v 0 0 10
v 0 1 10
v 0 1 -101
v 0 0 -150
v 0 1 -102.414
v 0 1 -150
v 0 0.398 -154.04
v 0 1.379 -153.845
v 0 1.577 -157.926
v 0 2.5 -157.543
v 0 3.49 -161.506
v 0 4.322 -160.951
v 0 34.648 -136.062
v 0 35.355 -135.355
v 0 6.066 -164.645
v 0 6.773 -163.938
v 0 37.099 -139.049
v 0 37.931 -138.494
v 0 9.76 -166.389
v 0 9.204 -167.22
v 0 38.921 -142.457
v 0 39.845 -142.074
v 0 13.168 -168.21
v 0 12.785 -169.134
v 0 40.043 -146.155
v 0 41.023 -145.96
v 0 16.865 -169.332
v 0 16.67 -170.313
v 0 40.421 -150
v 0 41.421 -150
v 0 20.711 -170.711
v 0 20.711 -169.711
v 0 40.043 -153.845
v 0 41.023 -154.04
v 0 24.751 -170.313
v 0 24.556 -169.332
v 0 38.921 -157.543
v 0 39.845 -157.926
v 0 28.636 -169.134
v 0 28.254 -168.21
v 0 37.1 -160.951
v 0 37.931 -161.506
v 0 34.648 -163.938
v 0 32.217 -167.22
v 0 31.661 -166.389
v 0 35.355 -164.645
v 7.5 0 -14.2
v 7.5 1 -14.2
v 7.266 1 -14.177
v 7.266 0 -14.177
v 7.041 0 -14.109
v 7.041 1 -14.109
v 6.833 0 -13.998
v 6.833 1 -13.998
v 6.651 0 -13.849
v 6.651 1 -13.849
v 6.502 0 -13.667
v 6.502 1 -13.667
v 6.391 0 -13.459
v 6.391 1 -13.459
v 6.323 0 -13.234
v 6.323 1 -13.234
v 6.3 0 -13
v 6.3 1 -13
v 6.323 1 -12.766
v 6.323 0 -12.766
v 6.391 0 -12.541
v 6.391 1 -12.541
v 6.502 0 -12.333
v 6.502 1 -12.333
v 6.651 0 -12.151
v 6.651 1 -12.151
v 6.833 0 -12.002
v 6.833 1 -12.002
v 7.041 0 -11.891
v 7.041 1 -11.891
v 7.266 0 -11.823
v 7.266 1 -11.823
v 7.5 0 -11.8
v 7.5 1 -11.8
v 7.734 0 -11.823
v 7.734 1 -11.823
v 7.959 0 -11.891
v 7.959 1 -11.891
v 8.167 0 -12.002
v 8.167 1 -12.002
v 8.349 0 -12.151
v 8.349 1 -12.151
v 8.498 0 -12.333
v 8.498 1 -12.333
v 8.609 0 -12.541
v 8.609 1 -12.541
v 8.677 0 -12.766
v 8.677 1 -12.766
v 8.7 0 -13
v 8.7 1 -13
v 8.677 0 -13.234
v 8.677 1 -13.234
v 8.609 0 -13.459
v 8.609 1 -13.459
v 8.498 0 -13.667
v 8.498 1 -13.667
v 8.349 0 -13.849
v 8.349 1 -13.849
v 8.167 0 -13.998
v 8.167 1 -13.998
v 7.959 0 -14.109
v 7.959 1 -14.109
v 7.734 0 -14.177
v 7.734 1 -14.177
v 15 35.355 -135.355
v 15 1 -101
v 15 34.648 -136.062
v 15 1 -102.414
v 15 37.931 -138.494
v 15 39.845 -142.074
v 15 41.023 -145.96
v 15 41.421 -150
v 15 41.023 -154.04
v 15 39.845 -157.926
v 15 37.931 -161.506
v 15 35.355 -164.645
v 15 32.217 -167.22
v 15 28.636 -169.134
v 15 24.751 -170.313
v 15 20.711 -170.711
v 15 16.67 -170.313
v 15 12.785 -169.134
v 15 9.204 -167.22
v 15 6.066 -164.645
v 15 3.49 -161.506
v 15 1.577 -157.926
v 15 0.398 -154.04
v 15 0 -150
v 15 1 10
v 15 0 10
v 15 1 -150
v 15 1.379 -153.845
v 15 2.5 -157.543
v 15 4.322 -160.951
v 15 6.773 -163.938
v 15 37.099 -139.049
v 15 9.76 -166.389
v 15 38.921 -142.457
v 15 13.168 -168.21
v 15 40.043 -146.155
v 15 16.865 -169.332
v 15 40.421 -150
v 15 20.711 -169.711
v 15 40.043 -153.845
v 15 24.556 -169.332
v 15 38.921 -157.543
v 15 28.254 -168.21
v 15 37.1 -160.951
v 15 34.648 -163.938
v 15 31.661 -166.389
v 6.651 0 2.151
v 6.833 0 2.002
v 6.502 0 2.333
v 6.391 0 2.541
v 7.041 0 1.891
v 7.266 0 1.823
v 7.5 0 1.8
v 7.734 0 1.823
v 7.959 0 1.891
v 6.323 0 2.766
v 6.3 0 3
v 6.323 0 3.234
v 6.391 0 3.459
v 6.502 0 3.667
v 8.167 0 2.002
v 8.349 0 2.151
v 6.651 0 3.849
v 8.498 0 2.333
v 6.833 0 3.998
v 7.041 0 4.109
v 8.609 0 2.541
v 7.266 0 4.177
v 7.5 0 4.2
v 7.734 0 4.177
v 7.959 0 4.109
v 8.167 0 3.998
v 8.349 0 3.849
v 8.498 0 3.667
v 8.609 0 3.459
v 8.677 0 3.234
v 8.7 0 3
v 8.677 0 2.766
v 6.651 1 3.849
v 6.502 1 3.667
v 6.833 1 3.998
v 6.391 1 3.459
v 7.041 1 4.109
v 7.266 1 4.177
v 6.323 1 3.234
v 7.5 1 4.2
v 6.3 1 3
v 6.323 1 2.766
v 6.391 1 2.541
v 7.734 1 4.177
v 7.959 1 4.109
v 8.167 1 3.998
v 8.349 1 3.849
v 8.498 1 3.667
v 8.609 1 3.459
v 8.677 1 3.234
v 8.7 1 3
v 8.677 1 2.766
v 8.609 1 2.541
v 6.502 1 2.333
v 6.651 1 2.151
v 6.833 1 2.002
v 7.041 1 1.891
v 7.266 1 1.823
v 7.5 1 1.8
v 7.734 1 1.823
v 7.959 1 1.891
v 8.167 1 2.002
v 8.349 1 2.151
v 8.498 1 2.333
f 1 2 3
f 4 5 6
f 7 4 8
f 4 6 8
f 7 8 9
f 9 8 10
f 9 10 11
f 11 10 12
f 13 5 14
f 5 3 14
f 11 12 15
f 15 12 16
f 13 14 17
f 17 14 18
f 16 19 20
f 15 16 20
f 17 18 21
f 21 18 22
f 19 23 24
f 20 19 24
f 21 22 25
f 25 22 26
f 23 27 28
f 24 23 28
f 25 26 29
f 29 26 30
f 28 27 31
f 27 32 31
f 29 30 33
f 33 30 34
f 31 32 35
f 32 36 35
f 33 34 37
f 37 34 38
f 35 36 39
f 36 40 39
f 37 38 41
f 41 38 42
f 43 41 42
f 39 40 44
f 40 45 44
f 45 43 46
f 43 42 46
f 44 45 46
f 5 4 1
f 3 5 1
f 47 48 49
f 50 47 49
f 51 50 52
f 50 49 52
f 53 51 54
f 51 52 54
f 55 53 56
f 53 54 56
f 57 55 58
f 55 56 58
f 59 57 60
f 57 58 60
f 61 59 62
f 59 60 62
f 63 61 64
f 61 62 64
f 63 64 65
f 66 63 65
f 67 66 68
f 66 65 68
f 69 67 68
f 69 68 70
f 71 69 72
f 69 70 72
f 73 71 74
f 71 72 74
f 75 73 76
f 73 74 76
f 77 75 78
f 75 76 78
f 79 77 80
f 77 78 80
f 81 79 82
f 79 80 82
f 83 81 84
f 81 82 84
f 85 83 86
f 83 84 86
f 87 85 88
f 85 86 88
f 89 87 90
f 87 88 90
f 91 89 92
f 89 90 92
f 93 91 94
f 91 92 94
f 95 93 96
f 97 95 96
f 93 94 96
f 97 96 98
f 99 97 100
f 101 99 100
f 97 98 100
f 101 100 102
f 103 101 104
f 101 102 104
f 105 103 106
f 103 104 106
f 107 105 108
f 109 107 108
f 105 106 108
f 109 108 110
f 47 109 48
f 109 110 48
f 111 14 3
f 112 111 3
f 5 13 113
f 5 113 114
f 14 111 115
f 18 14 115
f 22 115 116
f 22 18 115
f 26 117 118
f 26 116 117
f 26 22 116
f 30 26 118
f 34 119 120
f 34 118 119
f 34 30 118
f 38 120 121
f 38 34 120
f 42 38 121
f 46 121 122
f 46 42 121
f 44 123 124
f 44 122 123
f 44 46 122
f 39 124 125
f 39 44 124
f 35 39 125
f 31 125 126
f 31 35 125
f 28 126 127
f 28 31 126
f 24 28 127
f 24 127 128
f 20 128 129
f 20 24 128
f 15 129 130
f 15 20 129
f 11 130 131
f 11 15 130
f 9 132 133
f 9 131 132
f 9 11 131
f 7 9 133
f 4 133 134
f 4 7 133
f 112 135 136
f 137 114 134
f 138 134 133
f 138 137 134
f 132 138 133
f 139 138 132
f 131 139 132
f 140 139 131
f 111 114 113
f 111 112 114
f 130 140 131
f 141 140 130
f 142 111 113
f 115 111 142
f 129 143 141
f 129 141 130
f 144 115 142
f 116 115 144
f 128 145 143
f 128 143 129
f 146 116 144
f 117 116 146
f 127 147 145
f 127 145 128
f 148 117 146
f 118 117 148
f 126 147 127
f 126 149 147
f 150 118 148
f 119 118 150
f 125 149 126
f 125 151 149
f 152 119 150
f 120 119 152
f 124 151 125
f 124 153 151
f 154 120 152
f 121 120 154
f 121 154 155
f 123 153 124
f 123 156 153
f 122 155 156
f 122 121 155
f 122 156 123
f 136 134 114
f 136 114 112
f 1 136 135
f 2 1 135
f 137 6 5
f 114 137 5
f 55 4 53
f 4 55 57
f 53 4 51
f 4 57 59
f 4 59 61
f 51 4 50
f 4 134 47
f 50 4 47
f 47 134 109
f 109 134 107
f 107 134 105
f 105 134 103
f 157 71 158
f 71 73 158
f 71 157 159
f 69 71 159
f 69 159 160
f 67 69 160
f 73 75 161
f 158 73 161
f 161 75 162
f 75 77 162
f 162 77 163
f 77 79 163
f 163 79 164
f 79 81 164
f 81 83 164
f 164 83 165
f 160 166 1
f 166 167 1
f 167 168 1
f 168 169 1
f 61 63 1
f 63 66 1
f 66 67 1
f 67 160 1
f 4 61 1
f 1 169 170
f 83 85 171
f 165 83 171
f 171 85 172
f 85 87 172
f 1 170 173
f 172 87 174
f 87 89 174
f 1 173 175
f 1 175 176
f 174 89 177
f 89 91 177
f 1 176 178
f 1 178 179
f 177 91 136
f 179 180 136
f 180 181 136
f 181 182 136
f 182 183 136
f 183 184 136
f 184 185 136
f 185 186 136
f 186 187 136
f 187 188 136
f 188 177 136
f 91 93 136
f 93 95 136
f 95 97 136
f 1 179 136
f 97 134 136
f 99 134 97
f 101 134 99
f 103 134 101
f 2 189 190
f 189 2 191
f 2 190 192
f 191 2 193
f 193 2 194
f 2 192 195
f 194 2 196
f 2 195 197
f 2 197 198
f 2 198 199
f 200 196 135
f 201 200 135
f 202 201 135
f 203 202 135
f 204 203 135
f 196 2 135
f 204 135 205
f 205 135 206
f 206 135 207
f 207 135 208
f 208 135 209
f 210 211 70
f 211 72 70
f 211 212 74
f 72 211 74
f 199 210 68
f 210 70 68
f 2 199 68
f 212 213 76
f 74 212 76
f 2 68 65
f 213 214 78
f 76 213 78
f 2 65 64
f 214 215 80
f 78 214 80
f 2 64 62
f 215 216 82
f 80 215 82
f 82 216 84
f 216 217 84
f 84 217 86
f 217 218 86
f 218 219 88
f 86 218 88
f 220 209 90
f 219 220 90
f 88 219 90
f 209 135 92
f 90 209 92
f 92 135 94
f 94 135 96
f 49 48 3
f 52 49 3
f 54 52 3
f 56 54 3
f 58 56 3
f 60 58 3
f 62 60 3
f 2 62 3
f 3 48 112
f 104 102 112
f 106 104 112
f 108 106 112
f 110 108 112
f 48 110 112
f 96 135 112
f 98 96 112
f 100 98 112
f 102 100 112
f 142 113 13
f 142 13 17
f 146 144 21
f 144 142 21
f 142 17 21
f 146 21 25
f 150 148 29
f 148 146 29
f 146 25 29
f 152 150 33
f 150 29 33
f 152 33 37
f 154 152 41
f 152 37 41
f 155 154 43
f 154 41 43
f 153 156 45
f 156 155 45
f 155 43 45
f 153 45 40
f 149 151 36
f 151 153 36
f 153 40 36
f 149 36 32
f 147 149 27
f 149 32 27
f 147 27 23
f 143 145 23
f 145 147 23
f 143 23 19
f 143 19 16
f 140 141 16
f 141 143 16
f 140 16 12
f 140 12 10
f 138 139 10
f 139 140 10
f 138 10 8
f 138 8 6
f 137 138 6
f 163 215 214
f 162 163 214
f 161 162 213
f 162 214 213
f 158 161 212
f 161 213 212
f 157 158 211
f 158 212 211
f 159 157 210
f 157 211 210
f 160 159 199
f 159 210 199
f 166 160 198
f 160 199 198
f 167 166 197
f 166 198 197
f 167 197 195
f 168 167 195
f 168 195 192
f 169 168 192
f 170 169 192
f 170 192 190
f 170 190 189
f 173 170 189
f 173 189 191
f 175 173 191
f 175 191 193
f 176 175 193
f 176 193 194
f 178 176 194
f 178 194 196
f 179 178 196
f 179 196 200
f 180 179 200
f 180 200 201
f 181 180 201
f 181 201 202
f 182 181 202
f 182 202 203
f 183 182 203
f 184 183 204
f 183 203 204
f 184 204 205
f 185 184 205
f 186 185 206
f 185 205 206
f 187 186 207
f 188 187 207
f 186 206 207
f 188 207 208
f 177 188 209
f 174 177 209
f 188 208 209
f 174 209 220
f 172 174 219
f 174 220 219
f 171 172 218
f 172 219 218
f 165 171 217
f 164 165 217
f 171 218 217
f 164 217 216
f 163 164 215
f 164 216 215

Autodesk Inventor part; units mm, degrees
ref_plane "YZ Plane" through (0, 0, 0) normal (1, 0, 0) x (0, 1, 0)
ref_plane "XZ Plane" through (0, 0, 0) normal (0, 1, 0) x (-1, 0, 0)
ref_plane "XY Plane" through (0, 0, 0) normal (0, 0, 1) x (1, 0, 0)
sketch "スケッチ3" plane through (0, 0, 0) normal (1, 0, 0) x (0, 1, 0)
  line L0 (0, 0) -> (0, -150)
  line L1 (0, 0) -> (0, -100)
  arc A0 (0, -150) -> (35.3553, -135.3553) centre (20.7107, -150) ccw
  line L2 (0, -150) -> (20.7107, -150) construction
  line L3 (35.3553, -135.3553) -> (20.7107, -150) construction
  line L4 (35.3553, -135.3553) -> (0, -100)
  line L5 (0, 0) -> (1, 0)
  arc A1 (1, -150) -> (34.6482, -136.0624) centre (20.7107, -150) ccw
  line L6 (34.6482, -136.0624) -> (1, -102.4142)
  line L7 (1, -150) -> (1, -102.4142)
  dimension "d13" = 150
  dimension "d14" = 100
  dimension "d16" = 135
  dimension "d17" = 1
extrude "押し出し3" add sketch "スケッチ3" along normal blind 15
sketch "スケッチ4" plane through (0, 0, 0) normal (-1, 0, 0) x (0, 0, 1)
  line L0 (-100, 0) -> (-150, 0) projected
  line L1 (-100, 0) -> (0, 0)
  line L2 (0, 0) -> (0, 1)
  line L3 (0, 1) -> (-101, 1)
  line L4 (-135.3553, 35.3553) -> (-100, 0) projected
  line L5 (-101, 1) -> (-100, 0)
  dimension "d20" = 1
extrude "押し出し4" add sketch "スケッチ4" against normal blind 15
sketch "スケッチ5" plane through (15, 0, 0) normal (1, 0, 0) x (0, 0, -1)
  line L0 (0, 0) -> (150, 0) projected
  line L1 (0, 0) -> (-10, 0)
  line L2 (-10, 0) -> (-10, 1)
  line L3 (-10, 1) -> (0, 1)
  line L4 (0, 1) -> (0, 0)
  dimension "d23" = 10
  dimension "d24" = 1
extrude "押し出し5" add sketch "スケッチ5" against normal blind 15
hole "穴1" at (7.5, 0, 3) direction (0, 1, 0) diameter 2.4 end through all
hole "穴2" at (7.5, 0, -13) direction (0, 1, 0) diameter 2.4 end through all
properties part number "スタビライザ" material "アルミニウム"
